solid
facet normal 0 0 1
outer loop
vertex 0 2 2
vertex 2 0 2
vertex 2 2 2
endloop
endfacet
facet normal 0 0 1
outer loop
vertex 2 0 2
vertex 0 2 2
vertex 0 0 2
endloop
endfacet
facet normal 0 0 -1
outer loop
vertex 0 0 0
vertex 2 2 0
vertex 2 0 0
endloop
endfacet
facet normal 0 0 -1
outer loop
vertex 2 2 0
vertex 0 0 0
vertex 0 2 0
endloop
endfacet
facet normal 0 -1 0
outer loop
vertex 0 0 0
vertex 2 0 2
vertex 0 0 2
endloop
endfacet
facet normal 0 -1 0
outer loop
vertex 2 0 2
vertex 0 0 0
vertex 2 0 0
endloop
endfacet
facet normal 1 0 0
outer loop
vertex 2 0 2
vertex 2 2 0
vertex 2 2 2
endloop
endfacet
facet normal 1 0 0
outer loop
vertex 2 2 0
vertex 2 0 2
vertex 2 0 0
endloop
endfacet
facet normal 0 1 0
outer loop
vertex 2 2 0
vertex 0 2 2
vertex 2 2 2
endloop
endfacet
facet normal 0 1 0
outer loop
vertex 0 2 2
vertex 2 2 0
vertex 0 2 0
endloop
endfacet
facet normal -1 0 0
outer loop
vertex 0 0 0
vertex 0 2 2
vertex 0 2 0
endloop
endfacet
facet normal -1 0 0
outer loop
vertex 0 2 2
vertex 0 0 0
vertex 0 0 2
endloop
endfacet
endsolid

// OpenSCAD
slope = 20;
//degrees of the cut

//cut:
b_1=15;
b_3=10;
b_2=((b_3)*tan(slope));

//universal dimen
width=2;
length=(2);

module rectangle()
 {  //translate([-3.25, -15, 0])
    cube([length,width,2]);
 }

module slot ()
{  cube([b_3,width,2]);
}
module origin_slot ()
{  union()
    {
      cube([width/5,width,h]); 
        
      translate([1-width/2,width/2-1,0])
      cube([width,width/5,h]);       
    }
}

module hole()
{
 cylinder(3.6, r = 2.2, $fa=5, $fs=0.1);
}

    module prism(l, w, h) {
       polyhedron(points=[
               [0,0,h],           // 0    front top corner
               [0,0,0],[w,0,0],   // 1, 2 front left & right bottom corners
               [0,l,h],           // 3    back top corner
               [0,l,0],[w,l,0]    // 4, 5 back left & right bottom corners
       ], 
        faces=[ // points for all faces must be ordered clockwise when looking in
               [0,2,1],    // top face
               [3,4,5],    // base face
               [0,1,4,3],  // h face
               [1,2,5,4],  // w face
               [0,3,5,2],  // hypotenuse face
       ]);
}



    rectangle();

    
   
